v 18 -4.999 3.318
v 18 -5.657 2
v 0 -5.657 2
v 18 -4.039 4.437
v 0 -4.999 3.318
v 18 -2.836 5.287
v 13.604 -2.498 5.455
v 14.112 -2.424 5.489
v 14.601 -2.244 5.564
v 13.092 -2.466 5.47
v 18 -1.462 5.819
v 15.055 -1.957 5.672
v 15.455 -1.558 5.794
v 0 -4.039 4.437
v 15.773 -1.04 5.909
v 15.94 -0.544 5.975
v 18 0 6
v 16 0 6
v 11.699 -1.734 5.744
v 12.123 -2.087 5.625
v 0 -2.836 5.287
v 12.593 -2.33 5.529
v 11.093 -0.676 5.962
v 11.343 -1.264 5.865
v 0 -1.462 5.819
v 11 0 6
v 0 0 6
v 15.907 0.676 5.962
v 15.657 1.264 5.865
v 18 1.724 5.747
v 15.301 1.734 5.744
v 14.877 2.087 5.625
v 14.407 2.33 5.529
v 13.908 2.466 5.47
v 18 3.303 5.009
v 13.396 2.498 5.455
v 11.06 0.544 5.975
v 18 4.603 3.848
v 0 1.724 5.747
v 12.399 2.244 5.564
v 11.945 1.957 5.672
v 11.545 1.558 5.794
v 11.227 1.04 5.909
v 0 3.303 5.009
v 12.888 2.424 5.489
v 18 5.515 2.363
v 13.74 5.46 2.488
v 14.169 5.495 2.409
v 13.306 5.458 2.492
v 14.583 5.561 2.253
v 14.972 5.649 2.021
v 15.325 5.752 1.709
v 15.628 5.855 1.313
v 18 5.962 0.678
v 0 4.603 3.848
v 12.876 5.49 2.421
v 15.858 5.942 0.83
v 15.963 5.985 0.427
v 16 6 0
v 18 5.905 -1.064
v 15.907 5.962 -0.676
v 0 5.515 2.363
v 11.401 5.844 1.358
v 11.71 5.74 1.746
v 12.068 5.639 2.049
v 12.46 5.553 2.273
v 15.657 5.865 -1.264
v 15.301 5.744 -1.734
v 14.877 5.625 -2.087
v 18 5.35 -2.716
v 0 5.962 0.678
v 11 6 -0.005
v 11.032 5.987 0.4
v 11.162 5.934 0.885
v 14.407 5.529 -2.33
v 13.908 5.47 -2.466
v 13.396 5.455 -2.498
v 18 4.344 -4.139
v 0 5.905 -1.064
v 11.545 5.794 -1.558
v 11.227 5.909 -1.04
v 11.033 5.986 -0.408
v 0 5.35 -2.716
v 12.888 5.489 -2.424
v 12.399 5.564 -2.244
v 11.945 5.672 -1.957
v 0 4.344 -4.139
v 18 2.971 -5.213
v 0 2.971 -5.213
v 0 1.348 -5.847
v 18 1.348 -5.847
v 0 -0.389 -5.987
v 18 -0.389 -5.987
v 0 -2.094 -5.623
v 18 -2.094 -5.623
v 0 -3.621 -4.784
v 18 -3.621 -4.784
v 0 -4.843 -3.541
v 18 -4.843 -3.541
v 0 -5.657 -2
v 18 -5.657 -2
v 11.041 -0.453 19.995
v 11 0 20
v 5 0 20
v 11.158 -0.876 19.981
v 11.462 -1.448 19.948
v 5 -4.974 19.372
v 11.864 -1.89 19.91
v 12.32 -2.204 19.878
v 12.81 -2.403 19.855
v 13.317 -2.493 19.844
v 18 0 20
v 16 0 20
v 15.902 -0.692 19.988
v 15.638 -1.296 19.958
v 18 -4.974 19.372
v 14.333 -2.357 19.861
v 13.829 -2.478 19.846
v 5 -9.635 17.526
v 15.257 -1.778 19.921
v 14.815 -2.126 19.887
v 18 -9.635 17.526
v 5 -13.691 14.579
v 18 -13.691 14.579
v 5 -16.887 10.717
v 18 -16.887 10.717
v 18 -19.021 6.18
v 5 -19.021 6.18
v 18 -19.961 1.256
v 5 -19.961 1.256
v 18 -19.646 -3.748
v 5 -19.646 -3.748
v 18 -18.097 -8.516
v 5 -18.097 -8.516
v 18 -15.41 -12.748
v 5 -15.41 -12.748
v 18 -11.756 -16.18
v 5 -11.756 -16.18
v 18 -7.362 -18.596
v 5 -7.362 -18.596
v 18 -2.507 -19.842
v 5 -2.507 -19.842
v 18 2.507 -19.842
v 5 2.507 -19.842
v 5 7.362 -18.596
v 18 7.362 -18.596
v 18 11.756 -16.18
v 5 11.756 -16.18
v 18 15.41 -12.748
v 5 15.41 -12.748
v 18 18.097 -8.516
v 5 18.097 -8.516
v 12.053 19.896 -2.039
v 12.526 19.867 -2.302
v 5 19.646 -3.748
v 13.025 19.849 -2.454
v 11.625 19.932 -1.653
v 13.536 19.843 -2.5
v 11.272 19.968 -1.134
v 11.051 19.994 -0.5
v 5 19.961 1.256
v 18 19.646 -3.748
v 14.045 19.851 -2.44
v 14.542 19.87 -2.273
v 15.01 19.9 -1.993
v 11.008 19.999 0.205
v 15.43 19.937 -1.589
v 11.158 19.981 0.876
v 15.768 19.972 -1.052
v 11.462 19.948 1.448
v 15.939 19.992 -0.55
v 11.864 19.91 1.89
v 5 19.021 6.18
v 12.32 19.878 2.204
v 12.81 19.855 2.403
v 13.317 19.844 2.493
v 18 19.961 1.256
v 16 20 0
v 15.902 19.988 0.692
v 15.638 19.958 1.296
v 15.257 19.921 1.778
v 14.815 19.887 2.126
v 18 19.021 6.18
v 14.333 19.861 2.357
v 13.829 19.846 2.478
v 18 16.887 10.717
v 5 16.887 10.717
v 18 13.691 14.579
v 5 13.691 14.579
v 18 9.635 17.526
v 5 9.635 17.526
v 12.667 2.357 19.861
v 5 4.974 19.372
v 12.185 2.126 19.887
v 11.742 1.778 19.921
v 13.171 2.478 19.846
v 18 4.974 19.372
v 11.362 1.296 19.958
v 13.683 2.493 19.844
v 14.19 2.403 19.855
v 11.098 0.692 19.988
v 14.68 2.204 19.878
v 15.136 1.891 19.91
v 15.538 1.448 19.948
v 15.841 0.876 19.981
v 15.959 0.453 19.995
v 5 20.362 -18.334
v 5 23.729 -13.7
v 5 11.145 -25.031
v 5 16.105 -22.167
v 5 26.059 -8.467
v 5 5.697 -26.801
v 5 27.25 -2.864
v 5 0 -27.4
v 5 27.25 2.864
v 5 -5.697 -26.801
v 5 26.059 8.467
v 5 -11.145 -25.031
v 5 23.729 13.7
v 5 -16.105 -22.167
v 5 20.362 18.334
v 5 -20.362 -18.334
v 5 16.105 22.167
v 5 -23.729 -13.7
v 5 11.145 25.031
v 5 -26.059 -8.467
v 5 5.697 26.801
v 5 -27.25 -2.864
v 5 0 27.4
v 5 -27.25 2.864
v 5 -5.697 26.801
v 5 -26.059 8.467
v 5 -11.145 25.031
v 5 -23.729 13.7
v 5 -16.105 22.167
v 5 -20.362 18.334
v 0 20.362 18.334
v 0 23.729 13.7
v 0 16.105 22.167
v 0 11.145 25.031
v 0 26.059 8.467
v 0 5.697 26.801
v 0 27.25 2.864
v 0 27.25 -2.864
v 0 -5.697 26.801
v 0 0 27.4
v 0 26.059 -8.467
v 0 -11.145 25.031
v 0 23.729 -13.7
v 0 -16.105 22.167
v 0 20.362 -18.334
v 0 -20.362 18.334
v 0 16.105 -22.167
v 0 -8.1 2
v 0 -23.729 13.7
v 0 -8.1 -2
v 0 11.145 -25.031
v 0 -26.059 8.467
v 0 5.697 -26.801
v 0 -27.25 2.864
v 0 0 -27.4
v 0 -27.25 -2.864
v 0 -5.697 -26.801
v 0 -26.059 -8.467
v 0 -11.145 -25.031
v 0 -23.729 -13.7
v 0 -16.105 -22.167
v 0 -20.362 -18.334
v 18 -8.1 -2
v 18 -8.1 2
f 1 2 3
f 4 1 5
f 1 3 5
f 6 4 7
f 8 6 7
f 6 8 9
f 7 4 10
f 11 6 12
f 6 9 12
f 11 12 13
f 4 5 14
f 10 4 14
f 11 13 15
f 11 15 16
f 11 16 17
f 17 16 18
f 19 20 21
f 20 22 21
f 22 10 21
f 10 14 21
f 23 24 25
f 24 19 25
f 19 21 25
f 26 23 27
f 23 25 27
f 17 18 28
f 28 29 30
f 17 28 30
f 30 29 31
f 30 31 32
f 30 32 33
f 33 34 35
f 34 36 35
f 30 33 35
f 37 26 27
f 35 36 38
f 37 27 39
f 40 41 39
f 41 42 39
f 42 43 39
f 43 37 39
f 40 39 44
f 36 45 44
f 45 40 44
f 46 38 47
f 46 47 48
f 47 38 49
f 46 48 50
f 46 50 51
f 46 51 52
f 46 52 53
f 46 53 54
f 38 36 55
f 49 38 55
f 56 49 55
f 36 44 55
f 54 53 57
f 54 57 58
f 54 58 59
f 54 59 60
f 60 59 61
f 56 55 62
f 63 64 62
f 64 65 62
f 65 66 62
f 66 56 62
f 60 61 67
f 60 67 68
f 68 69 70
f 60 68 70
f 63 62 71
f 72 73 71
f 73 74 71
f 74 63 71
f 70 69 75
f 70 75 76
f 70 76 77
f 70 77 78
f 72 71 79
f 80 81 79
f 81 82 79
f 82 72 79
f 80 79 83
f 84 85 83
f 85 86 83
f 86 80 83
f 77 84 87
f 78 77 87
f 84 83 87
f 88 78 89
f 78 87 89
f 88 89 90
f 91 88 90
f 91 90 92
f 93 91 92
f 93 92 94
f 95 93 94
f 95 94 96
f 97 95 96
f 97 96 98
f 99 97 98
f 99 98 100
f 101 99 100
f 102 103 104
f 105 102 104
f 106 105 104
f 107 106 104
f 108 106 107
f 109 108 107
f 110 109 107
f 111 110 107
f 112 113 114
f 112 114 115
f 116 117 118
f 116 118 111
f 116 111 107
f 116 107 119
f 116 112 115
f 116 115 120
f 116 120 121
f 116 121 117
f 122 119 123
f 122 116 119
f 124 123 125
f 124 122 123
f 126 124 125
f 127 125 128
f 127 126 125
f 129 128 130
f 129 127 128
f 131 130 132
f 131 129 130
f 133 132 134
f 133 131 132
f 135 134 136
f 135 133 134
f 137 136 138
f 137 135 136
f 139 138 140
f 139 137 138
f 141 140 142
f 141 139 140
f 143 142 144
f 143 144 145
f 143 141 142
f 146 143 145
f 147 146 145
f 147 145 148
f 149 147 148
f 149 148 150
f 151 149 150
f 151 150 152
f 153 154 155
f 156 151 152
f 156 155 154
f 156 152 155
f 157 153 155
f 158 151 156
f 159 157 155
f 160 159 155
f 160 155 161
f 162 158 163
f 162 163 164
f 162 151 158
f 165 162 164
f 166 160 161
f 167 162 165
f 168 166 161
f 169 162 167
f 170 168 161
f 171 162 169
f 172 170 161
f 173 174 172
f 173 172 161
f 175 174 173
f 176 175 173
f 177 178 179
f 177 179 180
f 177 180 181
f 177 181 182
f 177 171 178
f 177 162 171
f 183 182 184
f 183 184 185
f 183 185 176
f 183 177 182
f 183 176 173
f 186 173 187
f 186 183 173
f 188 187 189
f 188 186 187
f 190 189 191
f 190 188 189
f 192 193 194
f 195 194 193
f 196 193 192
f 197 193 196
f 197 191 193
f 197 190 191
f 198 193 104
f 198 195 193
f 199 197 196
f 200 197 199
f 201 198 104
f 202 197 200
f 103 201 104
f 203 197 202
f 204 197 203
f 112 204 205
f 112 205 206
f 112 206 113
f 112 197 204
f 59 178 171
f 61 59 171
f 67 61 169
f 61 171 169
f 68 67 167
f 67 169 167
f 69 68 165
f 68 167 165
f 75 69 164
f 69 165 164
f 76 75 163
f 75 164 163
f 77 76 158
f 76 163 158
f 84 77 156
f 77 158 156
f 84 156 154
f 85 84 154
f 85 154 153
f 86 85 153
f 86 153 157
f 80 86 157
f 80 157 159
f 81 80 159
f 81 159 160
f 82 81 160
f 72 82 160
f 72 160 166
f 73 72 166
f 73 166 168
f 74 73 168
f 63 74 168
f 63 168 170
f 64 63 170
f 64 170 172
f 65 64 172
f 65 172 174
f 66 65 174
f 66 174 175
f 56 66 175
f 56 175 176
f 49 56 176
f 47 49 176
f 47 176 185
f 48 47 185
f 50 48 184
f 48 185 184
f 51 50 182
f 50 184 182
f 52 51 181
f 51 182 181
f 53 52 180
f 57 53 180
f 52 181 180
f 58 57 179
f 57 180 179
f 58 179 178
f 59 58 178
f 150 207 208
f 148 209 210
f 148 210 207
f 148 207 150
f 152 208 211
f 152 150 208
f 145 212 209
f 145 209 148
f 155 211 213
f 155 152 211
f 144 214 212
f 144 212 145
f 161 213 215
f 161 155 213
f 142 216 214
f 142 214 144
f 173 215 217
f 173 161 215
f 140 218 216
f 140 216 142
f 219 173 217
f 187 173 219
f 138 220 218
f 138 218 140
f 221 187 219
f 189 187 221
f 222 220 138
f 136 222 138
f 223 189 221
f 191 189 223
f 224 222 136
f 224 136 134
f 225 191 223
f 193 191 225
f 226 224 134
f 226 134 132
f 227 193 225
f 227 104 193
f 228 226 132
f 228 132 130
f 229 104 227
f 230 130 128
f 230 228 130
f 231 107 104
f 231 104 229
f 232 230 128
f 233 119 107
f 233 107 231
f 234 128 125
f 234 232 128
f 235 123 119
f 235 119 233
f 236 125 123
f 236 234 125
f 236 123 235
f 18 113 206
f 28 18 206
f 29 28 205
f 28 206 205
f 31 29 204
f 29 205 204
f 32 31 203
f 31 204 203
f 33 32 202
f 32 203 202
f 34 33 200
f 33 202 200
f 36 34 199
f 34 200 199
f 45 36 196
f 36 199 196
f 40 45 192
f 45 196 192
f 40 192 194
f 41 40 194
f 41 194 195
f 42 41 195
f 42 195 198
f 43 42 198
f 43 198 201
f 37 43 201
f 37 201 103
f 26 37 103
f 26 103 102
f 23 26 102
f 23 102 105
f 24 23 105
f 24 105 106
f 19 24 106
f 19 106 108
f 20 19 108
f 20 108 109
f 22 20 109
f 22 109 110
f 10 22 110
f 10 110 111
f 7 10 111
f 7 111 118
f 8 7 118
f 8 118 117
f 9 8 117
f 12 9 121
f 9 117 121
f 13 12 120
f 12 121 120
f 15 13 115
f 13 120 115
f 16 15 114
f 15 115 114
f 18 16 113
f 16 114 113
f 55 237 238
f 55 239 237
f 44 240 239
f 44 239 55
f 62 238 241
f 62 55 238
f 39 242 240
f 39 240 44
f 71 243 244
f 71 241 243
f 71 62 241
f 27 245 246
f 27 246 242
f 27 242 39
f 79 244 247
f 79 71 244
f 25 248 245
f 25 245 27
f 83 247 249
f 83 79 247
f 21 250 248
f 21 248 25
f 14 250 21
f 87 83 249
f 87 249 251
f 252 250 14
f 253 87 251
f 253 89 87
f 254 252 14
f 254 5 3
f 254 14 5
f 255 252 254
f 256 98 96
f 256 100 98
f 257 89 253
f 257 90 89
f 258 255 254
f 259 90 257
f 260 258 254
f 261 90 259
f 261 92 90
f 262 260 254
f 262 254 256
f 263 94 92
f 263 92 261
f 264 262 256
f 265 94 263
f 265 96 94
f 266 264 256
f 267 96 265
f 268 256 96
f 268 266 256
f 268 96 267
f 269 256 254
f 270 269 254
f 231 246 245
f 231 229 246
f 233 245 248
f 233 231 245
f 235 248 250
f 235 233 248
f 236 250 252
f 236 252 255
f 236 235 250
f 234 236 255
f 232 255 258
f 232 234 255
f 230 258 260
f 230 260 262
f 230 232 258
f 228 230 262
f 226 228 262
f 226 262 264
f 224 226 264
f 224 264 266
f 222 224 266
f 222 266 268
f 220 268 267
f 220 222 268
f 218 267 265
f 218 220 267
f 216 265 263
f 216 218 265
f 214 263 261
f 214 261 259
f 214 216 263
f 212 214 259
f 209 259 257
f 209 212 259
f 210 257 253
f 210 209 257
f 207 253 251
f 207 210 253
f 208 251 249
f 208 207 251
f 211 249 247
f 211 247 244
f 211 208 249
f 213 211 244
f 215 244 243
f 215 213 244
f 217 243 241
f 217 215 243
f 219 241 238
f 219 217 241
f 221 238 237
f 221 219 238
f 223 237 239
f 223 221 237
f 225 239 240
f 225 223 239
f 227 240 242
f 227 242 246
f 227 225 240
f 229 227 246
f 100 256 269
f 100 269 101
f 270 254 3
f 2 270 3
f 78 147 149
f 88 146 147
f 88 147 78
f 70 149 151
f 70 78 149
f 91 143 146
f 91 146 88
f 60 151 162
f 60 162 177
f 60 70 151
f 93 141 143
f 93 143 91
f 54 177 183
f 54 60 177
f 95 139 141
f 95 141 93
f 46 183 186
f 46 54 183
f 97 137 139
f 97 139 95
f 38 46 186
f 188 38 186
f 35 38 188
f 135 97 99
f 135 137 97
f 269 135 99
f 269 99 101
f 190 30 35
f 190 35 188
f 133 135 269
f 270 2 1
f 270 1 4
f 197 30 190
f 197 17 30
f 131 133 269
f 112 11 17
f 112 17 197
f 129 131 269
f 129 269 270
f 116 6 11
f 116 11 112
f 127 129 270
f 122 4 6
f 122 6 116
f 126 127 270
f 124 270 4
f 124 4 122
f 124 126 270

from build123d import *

# Parameters (mm, degrees)
SKETCH_2_R               = 6
CUT_EXTRUDE_1_DEPTH      = 45.55917414
HOLE_WIZARD_M6_1_REACH   = 58.389
HOLE_WIZARD_M6_1_BORE_R  = 2.5
PATTERN_CIRCULAR_1_COUNT = 2
PATTERN_CIRCULAR_1_ANGLE = 90
CUT_EXTRUDE_2_REACH      = 46.559
SKETCH_4_W               = 4
SKETCH_4_H               = 4.2
SKETCH_5_R               = 20
CUT_EXTRUDE_3_DEPTH      = 4


with BuildPart() as part:
    # 草图1 → 旋转1 (revolve)
    with BuildSketch(Plane.XY, mode=Mode.PRIVATE) as revolve_1_sk:
        Polygon((0, 0), (0, 27.4), (5, 27.4), (5, 20), (22, 20), (22, 0), align=None)
    revolve(revolve_1_sk.sketch.rotate(Axis((0, 0, 0), (1, 0, 0)), 90), axis=Axis((0, 0, 0), (1, 0, 0)))

    # 草图2 → 切除-拉伸1 (cut, through all)
    with BuildSketch(Plane.ZY):
        Circle(SKETCH_2_R)
    extrude(amount=-CUT_EXTRUDE_1_DEPTH, mode=Mode.SUBTRACT)

    # M6 螺纹孔1 bore (on position points) → M6 螺纹孔1 (cut, up to next)
    with BuildSketch(Plane(origin=(13.5, 0, 20), x_dir=(1, 0, 0), z_dir=(0, 0, 1)), mode=Mode.PRIVATE) as hole_wizard_m6_1_sk1:
        Circle(HOLE_WIZARD_M6_1_BORE_R)
    hole_wizard_m6_1_tool1 = extrude(hole_wizard_m6_1_sk1.sketch, amount=-HOLE_WIZARD_M6_1_REACH, mode=Mode.PRIVATE) & part.part
    hole_wizard_m6_1 = hole_wizard_m6_1_tool1.solids().sort_by_distance((13.5, 0, 20))[0]
    add(hole_wizard_m6_1, mode=Mode.SUBTRACT)

    # 阵列(圆周)1: M6 螺纹孔1 ×2 about axis
    pattern_circular_1_axis = Axis((22, 0, 0), (-1, 0, 0))
    for i in range(1, PATTERN_CIRCULAR_1_COUNT):
        add(hole_wizard_m6_1.rotate(pattern_circular_1_axis, i * PATTERN_CIRCULAR_1_ANGLE / (PATTERN_CIRCULAR_1_COUNT - 1)), mode=Mode.SUBTRACT)

    # 草图4 → 切除-拉伸2 (cut, up to next)
    with BuildSketch(Plane.ZY, mode=Mode.PRIVATE) as cut_extrude_2_sk1:
        with Locations((0, -6)):
            Rectangle(SKETCH_4_W, SKETCH_4_H)
    cut_extrude_2_tool1 = extrude(cut_extrude_2_sk1.sketch, amount=-CUT_EXTRUDE_2_REACH, mode=Mode.PRIVATE) & part.part
    add(cut_extrude_2_tool1.solids().sort_by_distance((0, -6, 0))[0], mode=Mode.SUBTRACT)

    # 草图5 → 切除-拉伸3 (cut)
    with BuildSketch(Plane(origin=(22, 0, 0), x_dir=(0, 0, -1), z_dir=(1, 0, 0))):
        with Locations(Location((0, 0, 0), (0, 0, 180))):
            Circle(SKETCH_5_R)
    extrude(amount=-CUT_EXTRUDE_3_DEPTH, mode=Mode.SUBTRACT)


solid = part.part
